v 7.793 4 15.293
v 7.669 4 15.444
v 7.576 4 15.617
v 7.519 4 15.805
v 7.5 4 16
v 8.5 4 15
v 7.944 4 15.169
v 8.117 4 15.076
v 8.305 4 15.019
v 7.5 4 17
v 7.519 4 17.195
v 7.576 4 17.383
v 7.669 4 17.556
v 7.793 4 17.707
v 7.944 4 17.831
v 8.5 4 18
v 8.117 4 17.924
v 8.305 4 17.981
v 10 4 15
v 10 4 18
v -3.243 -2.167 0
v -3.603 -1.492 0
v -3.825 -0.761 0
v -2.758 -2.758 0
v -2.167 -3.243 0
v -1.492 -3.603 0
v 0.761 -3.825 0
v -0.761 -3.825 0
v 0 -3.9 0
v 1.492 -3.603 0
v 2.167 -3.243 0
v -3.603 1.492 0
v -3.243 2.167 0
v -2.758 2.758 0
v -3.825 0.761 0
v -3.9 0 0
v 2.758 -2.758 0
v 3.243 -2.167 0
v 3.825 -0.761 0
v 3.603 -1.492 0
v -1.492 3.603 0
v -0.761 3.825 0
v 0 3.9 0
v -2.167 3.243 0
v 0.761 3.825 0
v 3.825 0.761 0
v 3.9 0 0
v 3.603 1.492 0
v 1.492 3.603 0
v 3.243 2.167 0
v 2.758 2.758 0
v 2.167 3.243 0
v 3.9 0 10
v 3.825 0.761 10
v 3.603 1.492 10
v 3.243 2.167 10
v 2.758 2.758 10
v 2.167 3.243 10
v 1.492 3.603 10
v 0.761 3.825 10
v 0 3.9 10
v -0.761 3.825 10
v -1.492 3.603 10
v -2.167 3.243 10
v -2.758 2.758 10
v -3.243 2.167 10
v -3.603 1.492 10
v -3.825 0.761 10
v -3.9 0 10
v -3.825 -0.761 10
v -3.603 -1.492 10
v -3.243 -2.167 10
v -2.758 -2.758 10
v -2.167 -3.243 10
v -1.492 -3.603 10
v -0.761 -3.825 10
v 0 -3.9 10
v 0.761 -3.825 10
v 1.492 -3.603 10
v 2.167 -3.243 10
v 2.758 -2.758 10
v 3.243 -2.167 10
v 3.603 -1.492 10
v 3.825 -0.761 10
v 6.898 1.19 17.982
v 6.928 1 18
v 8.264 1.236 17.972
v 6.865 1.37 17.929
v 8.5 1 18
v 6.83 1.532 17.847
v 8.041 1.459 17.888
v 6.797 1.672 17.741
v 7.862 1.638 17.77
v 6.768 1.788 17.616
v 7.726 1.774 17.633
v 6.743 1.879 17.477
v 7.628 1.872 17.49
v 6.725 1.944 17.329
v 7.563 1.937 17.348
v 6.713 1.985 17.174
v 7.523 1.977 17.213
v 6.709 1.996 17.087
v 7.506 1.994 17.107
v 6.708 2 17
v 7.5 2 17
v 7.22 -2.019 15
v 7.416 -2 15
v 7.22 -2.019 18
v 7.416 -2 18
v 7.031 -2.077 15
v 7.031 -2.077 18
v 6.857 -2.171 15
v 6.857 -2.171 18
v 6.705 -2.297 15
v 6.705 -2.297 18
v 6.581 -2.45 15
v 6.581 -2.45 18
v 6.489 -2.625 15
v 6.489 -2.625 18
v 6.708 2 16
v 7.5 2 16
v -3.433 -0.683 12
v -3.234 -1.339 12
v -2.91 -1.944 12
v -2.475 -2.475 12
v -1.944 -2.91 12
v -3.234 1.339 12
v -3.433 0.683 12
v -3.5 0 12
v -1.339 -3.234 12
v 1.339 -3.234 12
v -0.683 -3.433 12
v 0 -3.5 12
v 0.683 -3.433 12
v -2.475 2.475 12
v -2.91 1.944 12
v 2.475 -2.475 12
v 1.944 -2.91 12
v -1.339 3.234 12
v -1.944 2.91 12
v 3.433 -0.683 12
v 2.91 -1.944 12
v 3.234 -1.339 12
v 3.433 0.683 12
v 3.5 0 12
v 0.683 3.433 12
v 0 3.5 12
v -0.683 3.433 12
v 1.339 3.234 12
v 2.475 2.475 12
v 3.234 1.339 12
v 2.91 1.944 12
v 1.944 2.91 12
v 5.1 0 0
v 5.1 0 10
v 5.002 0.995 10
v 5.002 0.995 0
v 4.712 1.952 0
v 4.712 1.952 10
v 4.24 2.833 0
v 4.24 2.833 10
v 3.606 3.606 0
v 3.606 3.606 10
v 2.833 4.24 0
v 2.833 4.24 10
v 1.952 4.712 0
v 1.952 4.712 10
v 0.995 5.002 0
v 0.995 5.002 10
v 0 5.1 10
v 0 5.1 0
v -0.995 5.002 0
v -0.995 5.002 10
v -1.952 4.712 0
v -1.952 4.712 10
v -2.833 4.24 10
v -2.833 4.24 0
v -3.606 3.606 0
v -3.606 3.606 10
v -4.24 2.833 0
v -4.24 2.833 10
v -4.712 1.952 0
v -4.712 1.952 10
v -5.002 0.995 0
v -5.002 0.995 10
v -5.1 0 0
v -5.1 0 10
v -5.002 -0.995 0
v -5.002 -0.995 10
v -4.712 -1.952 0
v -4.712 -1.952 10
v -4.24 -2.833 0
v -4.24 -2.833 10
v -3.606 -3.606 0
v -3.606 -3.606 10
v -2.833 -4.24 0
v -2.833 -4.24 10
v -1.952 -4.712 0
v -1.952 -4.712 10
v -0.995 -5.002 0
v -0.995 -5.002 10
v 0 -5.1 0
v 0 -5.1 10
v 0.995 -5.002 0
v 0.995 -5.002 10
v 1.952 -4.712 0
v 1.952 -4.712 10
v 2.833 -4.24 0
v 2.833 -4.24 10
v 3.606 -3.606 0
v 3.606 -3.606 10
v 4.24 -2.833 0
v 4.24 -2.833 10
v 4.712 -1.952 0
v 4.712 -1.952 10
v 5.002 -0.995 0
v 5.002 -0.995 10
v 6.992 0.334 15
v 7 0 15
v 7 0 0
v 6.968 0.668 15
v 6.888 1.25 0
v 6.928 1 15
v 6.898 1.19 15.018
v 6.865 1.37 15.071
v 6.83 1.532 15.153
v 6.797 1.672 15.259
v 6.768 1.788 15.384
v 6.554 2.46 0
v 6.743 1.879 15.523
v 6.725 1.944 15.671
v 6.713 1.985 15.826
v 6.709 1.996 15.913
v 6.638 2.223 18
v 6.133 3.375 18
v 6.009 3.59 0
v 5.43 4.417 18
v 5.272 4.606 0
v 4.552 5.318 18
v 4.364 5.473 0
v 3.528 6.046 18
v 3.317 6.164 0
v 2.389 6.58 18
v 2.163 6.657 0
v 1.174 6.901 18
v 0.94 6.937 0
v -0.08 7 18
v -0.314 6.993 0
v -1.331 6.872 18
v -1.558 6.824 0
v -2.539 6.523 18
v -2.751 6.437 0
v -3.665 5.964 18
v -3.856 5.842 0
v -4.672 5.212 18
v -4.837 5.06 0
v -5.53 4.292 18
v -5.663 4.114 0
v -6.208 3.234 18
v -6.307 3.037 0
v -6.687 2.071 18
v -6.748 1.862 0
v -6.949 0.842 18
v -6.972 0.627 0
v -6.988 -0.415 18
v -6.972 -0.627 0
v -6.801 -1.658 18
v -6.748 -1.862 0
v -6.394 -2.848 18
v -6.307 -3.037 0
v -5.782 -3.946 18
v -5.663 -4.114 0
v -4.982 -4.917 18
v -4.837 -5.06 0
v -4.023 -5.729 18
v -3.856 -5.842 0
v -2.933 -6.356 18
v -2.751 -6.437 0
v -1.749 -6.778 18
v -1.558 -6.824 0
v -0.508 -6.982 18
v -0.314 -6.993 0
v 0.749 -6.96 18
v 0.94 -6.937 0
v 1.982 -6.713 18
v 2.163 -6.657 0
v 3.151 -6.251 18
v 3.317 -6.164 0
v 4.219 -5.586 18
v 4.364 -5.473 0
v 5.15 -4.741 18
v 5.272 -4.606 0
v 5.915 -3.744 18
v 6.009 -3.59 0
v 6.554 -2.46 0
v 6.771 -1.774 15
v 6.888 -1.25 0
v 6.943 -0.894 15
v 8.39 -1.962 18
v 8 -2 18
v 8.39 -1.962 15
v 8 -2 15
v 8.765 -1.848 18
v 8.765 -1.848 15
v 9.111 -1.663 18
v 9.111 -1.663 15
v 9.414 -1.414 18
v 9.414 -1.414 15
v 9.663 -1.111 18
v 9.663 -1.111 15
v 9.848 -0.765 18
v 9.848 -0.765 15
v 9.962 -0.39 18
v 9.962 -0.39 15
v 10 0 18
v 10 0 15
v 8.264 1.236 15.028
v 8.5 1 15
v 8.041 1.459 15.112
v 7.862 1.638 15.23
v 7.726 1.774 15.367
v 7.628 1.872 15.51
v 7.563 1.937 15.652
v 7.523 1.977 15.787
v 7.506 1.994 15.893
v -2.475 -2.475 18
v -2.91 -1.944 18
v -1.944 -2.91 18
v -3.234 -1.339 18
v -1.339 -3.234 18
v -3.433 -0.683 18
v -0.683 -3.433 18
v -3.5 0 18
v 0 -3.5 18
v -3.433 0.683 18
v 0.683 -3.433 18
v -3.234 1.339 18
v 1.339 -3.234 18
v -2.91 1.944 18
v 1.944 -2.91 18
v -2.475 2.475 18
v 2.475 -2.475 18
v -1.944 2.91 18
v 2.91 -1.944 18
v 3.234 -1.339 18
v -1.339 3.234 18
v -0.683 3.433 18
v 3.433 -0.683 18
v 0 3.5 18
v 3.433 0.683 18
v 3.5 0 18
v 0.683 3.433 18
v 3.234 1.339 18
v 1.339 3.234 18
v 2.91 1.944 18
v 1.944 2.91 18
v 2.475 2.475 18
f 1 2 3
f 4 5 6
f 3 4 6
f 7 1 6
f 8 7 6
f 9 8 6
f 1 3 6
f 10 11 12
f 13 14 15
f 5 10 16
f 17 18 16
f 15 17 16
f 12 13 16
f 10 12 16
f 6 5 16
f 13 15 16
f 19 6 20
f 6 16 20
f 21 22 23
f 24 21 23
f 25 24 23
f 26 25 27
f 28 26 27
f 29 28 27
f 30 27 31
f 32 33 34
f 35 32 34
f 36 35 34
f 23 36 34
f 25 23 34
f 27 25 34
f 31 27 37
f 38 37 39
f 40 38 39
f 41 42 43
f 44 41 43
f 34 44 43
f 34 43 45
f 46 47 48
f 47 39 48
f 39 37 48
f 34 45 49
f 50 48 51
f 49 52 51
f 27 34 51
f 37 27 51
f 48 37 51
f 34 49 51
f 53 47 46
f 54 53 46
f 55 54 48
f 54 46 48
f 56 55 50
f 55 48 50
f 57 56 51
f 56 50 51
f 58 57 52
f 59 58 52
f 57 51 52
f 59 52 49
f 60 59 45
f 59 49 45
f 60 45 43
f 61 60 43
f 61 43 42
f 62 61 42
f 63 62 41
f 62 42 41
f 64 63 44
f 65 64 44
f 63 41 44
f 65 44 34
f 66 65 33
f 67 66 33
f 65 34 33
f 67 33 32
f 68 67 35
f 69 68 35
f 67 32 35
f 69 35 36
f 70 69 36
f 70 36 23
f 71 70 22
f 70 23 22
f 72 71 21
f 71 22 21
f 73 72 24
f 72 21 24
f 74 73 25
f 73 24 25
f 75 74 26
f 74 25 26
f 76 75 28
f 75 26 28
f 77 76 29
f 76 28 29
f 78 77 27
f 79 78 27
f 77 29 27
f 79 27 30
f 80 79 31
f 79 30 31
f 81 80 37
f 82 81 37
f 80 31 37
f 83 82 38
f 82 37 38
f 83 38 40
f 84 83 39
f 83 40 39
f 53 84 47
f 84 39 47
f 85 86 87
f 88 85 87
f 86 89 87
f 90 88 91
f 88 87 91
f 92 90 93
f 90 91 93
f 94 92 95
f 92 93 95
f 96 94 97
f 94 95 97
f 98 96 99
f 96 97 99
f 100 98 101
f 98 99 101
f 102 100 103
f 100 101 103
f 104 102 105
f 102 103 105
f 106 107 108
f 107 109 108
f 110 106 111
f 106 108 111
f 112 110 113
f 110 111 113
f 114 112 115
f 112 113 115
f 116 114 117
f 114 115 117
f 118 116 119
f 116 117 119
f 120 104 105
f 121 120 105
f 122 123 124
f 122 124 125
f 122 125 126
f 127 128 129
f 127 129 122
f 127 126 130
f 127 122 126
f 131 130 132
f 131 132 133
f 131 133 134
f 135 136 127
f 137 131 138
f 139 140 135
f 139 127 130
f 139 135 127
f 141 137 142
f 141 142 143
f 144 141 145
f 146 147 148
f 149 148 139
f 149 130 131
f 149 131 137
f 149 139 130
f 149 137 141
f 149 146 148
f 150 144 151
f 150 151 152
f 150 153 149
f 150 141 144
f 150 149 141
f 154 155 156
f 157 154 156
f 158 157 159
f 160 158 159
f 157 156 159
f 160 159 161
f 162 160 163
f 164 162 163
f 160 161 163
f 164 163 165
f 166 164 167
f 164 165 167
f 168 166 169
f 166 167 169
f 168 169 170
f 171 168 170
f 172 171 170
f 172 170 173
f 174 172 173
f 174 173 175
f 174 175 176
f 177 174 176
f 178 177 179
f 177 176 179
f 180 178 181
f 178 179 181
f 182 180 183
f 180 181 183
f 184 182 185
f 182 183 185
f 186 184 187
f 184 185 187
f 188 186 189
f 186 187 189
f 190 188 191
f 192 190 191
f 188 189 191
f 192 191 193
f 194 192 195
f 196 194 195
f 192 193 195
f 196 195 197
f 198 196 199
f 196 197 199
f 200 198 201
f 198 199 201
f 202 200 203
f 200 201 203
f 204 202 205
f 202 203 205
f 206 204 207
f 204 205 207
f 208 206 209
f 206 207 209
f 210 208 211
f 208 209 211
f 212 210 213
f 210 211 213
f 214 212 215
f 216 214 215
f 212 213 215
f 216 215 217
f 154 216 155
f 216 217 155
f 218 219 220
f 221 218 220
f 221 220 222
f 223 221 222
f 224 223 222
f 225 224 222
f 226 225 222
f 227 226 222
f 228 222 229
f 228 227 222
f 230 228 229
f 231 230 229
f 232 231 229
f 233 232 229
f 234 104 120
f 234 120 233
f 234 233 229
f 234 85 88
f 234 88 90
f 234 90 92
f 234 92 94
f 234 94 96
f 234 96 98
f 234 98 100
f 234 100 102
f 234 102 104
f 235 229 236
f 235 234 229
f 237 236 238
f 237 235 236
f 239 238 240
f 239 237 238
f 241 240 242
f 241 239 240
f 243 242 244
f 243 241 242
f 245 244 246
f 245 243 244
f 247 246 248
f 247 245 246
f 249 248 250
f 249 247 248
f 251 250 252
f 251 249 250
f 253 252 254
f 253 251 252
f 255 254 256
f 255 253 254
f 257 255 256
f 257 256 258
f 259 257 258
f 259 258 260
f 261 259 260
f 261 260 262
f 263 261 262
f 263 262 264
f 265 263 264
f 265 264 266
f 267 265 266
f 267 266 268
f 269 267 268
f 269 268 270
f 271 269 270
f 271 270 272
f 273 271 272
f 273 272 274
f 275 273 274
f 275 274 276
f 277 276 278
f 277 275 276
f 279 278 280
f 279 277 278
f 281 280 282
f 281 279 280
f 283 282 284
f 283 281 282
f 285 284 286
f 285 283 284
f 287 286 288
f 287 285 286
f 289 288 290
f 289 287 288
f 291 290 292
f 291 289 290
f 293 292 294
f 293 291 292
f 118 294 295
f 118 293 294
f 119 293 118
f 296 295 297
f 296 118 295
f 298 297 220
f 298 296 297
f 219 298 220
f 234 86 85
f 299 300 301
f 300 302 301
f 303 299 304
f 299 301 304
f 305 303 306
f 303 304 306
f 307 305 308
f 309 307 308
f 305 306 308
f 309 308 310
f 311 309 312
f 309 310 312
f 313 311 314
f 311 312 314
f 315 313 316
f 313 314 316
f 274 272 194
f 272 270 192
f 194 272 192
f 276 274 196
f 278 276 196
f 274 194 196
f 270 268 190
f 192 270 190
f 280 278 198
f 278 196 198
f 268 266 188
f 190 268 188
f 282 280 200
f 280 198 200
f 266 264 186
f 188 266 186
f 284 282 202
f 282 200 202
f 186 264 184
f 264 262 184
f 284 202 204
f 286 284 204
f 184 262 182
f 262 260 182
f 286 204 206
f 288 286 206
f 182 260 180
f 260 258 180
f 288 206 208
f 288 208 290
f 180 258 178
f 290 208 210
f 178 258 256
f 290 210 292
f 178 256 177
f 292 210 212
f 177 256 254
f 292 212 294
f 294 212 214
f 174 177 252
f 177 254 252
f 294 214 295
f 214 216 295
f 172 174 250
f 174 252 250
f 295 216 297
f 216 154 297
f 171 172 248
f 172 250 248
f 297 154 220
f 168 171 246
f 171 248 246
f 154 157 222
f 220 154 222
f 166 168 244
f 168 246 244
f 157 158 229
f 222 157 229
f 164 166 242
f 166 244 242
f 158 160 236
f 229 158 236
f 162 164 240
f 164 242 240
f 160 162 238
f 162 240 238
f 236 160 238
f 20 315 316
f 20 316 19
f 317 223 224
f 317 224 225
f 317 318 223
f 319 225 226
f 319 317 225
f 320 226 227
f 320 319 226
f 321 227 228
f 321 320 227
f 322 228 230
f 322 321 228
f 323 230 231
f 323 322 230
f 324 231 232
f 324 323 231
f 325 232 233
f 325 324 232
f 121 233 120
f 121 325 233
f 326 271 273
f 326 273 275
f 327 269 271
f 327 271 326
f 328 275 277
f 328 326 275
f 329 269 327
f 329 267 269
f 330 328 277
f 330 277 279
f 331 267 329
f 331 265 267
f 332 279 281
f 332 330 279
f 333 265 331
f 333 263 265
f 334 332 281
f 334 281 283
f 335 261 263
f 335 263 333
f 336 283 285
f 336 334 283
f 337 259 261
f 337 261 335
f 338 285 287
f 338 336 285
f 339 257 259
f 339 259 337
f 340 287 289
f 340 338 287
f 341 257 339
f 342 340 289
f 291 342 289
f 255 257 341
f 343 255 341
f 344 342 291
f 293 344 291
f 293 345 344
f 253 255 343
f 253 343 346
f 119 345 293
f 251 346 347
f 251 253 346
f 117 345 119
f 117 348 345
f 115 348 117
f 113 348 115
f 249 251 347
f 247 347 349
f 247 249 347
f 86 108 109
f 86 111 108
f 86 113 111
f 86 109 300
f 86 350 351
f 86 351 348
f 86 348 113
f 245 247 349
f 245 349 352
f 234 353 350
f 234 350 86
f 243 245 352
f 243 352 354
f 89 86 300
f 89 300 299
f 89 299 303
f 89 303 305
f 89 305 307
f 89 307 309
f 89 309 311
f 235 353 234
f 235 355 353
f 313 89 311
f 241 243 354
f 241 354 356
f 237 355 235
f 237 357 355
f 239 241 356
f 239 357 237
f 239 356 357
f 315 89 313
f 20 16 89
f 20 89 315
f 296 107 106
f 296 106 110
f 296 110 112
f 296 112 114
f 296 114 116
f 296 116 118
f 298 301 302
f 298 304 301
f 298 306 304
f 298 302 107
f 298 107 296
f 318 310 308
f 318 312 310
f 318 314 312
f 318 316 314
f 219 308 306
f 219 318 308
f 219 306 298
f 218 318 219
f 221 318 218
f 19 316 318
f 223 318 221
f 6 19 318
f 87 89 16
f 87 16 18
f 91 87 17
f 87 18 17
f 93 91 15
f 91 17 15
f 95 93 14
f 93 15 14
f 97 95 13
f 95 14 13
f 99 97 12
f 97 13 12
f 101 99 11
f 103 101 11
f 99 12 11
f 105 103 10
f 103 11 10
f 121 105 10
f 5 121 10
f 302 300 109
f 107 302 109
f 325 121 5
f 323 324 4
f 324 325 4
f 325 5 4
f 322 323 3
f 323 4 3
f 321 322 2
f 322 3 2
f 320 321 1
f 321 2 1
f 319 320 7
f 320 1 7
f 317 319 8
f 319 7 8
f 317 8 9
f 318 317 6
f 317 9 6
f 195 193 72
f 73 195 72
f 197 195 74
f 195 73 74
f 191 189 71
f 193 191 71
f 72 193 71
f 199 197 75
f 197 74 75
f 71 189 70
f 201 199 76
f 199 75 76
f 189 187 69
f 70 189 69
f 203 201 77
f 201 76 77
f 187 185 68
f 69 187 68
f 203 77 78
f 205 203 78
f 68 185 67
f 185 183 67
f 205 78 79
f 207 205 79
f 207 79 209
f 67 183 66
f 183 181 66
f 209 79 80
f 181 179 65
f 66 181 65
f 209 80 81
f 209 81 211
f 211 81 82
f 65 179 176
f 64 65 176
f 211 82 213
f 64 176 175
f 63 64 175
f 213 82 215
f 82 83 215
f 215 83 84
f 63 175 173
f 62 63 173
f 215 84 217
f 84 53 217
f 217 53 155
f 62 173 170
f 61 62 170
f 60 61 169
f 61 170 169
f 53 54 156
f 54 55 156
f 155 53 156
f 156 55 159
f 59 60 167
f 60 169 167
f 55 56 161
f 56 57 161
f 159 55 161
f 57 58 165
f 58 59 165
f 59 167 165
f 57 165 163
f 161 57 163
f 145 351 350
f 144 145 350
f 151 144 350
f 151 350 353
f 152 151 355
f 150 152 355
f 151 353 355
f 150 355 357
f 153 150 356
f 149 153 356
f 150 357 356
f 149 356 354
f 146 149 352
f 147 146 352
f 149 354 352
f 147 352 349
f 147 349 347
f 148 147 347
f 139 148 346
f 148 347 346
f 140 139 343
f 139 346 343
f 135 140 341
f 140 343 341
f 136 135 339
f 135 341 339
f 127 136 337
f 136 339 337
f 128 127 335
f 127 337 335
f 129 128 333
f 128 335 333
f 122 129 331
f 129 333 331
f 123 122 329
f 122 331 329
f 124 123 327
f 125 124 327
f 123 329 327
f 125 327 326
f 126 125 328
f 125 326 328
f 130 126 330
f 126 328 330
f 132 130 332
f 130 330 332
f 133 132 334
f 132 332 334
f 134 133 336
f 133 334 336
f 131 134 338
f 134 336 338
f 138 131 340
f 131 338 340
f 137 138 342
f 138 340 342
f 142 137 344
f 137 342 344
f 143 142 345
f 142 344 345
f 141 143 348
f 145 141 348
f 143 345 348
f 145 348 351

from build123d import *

# Parameters (mm, degrees)
SKETCH059_R     = 3.9
PAD013_DEPTH    = 10
SKETCH060_R     = 7
PAD014_DEPTH    = 8
SKETCH061_R     = 3.5
POCKET033_DEPTH = 6
SKETCH062_R     = 7
SKETCH062_R_2   = 5.1
PAD015_DEPTH    = 10
PAD016_DEPTH    = 3
FILLET014_R     = 2
FILLET015_R     = 1
FILLET016_R     = 1


with BuildPart() as part:
    # Sketch059 → Pad013 (new body)
    with BuildSketch(Plane.XY):
        Circle(SKETCH059_R)
    extrude(amount=PAD013_DEPTH)

    # Sketch060 → Pad014 (join)
    with BuildSketch(Plane.XY.offset(10)):
        Circle(SKETCH060_R)
    extrude(amount=PAD014_DEPTH)

    # Sketch061 → Pocket033 (cut)
    with BuildSketch(Plane.XY.offset(18)):
        Circle(SKETCH061_R)
    extrude(amount=-POCKET033_DEPTH, mode=Mode.SUBTRACT)

    # Sketch062 → Pad015 (join)
    with BuildSketch(Plane.XY.offset(10)):
        Circle(SKETCH062_R)
        Circle(SKETCH062_R_2, mode=Mode.SUBTRACT)
    extrude(amount=-PAD015_DEPTH)

    # Sketch063 → Pad016 (join)
    with BuildSketch(Plane.XY.offset(18)):
        Polygon((6, 2), (7.5, 2), (7.5, 4), (10, 4), (10, 2), (10, -2), (6, -2), align=None)
    extrude(amount=-PAD016_DEPTH)

    # Fillet014
    fillet014_edges = [part.edges().sort_by_distance(p)[0] for p in [
        (10, -2, 16.5),
    ]]
    fillet(fillet014_edges, radius=FILLET014_R)

    # Fillet015
    fillet015_edges = [part.edges().sort_by_distance(p)[0] for p in [
        (6.708204, -2, 16.5),
    ]]
    fillet(fillet015_edges, radius=FILLET015_R)

    # Fillet016
    fillet016_edges = [part.edges().sort_by_distance(p)[0] for p in [
        (7.104102, 2, 15),
        (7.5, 3, 15),
        (7.104102, 2, 18),
        (7.5, 3, 18),
    ]]
    fillet(fillet016_edges, radius=FILLET016_R)


solid = part.part
